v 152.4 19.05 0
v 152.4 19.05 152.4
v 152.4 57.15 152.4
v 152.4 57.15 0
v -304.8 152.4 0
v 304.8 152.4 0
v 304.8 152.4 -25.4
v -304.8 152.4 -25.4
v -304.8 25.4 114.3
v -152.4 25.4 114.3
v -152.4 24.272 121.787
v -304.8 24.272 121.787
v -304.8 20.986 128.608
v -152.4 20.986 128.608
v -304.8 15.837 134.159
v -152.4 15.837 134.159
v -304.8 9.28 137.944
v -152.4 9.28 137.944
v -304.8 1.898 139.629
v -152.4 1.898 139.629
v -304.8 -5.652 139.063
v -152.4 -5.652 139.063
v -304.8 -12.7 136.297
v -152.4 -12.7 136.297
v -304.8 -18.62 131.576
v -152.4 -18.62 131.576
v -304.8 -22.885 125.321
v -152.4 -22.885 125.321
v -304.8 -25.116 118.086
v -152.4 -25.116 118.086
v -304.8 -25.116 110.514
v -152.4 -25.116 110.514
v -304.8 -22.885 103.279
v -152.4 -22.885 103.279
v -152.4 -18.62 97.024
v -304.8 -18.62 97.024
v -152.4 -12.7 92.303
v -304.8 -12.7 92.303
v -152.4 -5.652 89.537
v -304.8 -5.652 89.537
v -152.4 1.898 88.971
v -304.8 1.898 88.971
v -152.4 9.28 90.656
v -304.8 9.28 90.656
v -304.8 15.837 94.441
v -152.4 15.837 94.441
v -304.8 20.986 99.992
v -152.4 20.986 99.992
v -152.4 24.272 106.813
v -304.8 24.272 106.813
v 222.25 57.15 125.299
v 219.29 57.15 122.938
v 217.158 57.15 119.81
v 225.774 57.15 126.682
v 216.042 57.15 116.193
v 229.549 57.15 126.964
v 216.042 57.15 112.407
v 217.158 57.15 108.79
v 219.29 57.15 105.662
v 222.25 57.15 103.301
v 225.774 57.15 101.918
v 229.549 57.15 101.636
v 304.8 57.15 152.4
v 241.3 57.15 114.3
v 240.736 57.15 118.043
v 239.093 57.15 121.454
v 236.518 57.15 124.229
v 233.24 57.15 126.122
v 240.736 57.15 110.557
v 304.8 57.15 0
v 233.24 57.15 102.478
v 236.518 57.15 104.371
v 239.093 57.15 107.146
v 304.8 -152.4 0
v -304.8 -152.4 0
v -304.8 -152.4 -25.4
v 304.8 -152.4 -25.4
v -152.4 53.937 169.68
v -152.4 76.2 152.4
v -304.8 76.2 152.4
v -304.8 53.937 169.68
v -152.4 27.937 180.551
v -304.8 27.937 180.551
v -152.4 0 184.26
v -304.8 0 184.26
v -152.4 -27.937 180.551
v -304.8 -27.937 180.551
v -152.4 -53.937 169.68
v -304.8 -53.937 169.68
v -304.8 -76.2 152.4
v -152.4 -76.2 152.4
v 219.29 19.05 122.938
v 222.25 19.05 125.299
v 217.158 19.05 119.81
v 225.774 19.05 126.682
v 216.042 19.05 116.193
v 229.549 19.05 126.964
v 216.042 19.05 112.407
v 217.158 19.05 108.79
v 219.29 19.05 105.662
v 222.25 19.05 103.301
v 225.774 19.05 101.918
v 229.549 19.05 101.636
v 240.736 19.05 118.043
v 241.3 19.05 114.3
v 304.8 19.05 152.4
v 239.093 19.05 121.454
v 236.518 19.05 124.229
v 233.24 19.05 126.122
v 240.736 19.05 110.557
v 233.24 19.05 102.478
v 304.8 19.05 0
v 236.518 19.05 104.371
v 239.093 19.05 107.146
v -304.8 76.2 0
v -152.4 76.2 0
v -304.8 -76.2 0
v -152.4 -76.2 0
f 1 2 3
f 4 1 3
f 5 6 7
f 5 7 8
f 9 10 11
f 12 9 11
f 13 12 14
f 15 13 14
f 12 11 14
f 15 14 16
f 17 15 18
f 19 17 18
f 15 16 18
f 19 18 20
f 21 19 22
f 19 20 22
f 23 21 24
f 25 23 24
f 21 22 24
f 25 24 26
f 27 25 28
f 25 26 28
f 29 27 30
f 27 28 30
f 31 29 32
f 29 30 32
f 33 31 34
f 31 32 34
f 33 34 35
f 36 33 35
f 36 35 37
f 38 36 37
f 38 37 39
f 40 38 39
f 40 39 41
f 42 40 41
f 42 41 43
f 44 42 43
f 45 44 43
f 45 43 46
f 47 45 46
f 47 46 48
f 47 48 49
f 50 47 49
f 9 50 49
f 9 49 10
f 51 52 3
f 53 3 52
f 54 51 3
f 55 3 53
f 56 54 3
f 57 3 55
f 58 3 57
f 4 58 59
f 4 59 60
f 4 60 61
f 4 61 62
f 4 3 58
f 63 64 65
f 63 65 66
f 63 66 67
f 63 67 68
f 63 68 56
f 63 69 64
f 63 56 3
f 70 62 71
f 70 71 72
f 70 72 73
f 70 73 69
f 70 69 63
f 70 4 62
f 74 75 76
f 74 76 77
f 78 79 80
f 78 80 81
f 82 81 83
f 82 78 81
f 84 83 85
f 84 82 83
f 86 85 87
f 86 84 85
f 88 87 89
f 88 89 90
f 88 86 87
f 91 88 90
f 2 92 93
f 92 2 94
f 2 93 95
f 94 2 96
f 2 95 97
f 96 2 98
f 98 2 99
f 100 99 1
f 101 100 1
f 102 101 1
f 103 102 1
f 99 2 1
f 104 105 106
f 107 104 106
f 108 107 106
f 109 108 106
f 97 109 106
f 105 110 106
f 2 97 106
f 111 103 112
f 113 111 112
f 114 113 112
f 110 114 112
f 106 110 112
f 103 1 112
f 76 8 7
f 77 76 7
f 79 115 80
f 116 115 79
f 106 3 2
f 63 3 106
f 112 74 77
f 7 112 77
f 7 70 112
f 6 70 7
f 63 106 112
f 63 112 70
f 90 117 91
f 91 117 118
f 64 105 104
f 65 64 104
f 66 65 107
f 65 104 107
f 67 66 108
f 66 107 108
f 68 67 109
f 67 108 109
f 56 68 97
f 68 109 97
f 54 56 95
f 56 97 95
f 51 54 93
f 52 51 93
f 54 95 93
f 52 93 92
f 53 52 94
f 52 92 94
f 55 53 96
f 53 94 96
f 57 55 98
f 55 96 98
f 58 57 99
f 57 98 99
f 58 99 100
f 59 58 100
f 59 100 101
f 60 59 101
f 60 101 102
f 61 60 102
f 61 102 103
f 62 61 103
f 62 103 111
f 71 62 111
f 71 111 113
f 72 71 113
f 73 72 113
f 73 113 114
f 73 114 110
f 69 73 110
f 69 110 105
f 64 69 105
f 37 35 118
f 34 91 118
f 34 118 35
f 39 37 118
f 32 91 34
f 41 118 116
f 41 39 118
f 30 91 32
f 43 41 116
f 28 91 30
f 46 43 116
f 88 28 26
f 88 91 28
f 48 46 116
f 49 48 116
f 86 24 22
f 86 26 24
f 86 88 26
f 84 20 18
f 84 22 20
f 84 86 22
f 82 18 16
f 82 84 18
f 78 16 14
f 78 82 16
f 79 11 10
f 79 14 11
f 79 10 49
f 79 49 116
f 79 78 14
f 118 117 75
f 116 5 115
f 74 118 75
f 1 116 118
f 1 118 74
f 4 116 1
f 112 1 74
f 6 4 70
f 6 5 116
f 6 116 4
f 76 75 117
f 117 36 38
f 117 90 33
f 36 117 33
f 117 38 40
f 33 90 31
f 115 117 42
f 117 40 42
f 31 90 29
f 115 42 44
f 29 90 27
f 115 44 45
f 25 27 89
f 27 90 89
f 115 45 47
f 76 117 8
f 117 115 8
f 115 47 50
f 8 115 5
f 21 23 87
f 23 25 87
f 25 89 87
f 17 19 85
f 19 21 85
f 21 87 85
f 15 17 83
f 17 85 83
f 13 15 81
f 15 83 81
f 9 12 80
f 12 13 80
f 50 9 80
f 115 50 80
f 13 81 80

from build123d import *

# Parameters (mm, degrees)
F1_DEPTH  = 25.4
F2_W      = 152.4
F2_H      = 152.4
F3_DEPTH  = 152.4
F4_R      = 25.4
F5_DEPTH  = 152.401
F6_W      = 152.4
F6_H      = 38.1
F7_DEPTH  = 152.4
F8_R      = 12.7
F9_DEPTH  = 133.351
F11_DEPTH = 152.4


with BuildPart() as f1:
    # F0 (on Top) → F1 (new body)
    with BuildSketch(Plane.XY):
        Polygon((304.8, 152.4), (-304.8, 152.4), (-304.8, 0), (-304.8, -152.4), (304.8, -152.4), align=None)
    extrude(amount=-F1_DEPTH)

    # F2 (on face) → F3 (join)
    with BuildSketch(Plane.XY):
        with Locations((-228.6, 0)):
            Rectangle(F2_W, F2_H)
    extrude(amount=F3_DEPTH)

    # F4 (on face) → F5 (cut, through all)
    with BuildSketch(Plane.YZ.offset(-152.4)):
        with Locations((0, 114.3)):
            Circle(F4_R)
    extrude(amount=-F5_DEPTH, mode=Mode.SUBTRACT)

    # F6 (on face) → F7 (join)
    with BuildSketch(Plane.XY):
        with Locations((228.6, 38.1)):
            Rectangle(F6_W, F6_H)
    extrude(amount=F7_DEPTH)

    # F8 (on face) → F9 (cut, through all)
    with BuildSketch(Plane.XZ.offset(-19.05)):
        with Locations((228.6, 114.3)):
            Circle(F8_R)
    extrude(amount=-F9_DEPTH, mode=Mode.SUBTRACT)

    # F10 (on face) → F11 (join, through all)
    with BuildSketch(Plane.YZ.offset(-152.4)):
        with BuildLine():
            Line((-76.2, 152.4), (76.2, 152.4))
            ThreePointArc((76.2, 152.4), (0, 184.260238), (-76.2, 152.4))
        make_face()
    extrude(amount=-F11_DEPTH)


solid = f1.part
